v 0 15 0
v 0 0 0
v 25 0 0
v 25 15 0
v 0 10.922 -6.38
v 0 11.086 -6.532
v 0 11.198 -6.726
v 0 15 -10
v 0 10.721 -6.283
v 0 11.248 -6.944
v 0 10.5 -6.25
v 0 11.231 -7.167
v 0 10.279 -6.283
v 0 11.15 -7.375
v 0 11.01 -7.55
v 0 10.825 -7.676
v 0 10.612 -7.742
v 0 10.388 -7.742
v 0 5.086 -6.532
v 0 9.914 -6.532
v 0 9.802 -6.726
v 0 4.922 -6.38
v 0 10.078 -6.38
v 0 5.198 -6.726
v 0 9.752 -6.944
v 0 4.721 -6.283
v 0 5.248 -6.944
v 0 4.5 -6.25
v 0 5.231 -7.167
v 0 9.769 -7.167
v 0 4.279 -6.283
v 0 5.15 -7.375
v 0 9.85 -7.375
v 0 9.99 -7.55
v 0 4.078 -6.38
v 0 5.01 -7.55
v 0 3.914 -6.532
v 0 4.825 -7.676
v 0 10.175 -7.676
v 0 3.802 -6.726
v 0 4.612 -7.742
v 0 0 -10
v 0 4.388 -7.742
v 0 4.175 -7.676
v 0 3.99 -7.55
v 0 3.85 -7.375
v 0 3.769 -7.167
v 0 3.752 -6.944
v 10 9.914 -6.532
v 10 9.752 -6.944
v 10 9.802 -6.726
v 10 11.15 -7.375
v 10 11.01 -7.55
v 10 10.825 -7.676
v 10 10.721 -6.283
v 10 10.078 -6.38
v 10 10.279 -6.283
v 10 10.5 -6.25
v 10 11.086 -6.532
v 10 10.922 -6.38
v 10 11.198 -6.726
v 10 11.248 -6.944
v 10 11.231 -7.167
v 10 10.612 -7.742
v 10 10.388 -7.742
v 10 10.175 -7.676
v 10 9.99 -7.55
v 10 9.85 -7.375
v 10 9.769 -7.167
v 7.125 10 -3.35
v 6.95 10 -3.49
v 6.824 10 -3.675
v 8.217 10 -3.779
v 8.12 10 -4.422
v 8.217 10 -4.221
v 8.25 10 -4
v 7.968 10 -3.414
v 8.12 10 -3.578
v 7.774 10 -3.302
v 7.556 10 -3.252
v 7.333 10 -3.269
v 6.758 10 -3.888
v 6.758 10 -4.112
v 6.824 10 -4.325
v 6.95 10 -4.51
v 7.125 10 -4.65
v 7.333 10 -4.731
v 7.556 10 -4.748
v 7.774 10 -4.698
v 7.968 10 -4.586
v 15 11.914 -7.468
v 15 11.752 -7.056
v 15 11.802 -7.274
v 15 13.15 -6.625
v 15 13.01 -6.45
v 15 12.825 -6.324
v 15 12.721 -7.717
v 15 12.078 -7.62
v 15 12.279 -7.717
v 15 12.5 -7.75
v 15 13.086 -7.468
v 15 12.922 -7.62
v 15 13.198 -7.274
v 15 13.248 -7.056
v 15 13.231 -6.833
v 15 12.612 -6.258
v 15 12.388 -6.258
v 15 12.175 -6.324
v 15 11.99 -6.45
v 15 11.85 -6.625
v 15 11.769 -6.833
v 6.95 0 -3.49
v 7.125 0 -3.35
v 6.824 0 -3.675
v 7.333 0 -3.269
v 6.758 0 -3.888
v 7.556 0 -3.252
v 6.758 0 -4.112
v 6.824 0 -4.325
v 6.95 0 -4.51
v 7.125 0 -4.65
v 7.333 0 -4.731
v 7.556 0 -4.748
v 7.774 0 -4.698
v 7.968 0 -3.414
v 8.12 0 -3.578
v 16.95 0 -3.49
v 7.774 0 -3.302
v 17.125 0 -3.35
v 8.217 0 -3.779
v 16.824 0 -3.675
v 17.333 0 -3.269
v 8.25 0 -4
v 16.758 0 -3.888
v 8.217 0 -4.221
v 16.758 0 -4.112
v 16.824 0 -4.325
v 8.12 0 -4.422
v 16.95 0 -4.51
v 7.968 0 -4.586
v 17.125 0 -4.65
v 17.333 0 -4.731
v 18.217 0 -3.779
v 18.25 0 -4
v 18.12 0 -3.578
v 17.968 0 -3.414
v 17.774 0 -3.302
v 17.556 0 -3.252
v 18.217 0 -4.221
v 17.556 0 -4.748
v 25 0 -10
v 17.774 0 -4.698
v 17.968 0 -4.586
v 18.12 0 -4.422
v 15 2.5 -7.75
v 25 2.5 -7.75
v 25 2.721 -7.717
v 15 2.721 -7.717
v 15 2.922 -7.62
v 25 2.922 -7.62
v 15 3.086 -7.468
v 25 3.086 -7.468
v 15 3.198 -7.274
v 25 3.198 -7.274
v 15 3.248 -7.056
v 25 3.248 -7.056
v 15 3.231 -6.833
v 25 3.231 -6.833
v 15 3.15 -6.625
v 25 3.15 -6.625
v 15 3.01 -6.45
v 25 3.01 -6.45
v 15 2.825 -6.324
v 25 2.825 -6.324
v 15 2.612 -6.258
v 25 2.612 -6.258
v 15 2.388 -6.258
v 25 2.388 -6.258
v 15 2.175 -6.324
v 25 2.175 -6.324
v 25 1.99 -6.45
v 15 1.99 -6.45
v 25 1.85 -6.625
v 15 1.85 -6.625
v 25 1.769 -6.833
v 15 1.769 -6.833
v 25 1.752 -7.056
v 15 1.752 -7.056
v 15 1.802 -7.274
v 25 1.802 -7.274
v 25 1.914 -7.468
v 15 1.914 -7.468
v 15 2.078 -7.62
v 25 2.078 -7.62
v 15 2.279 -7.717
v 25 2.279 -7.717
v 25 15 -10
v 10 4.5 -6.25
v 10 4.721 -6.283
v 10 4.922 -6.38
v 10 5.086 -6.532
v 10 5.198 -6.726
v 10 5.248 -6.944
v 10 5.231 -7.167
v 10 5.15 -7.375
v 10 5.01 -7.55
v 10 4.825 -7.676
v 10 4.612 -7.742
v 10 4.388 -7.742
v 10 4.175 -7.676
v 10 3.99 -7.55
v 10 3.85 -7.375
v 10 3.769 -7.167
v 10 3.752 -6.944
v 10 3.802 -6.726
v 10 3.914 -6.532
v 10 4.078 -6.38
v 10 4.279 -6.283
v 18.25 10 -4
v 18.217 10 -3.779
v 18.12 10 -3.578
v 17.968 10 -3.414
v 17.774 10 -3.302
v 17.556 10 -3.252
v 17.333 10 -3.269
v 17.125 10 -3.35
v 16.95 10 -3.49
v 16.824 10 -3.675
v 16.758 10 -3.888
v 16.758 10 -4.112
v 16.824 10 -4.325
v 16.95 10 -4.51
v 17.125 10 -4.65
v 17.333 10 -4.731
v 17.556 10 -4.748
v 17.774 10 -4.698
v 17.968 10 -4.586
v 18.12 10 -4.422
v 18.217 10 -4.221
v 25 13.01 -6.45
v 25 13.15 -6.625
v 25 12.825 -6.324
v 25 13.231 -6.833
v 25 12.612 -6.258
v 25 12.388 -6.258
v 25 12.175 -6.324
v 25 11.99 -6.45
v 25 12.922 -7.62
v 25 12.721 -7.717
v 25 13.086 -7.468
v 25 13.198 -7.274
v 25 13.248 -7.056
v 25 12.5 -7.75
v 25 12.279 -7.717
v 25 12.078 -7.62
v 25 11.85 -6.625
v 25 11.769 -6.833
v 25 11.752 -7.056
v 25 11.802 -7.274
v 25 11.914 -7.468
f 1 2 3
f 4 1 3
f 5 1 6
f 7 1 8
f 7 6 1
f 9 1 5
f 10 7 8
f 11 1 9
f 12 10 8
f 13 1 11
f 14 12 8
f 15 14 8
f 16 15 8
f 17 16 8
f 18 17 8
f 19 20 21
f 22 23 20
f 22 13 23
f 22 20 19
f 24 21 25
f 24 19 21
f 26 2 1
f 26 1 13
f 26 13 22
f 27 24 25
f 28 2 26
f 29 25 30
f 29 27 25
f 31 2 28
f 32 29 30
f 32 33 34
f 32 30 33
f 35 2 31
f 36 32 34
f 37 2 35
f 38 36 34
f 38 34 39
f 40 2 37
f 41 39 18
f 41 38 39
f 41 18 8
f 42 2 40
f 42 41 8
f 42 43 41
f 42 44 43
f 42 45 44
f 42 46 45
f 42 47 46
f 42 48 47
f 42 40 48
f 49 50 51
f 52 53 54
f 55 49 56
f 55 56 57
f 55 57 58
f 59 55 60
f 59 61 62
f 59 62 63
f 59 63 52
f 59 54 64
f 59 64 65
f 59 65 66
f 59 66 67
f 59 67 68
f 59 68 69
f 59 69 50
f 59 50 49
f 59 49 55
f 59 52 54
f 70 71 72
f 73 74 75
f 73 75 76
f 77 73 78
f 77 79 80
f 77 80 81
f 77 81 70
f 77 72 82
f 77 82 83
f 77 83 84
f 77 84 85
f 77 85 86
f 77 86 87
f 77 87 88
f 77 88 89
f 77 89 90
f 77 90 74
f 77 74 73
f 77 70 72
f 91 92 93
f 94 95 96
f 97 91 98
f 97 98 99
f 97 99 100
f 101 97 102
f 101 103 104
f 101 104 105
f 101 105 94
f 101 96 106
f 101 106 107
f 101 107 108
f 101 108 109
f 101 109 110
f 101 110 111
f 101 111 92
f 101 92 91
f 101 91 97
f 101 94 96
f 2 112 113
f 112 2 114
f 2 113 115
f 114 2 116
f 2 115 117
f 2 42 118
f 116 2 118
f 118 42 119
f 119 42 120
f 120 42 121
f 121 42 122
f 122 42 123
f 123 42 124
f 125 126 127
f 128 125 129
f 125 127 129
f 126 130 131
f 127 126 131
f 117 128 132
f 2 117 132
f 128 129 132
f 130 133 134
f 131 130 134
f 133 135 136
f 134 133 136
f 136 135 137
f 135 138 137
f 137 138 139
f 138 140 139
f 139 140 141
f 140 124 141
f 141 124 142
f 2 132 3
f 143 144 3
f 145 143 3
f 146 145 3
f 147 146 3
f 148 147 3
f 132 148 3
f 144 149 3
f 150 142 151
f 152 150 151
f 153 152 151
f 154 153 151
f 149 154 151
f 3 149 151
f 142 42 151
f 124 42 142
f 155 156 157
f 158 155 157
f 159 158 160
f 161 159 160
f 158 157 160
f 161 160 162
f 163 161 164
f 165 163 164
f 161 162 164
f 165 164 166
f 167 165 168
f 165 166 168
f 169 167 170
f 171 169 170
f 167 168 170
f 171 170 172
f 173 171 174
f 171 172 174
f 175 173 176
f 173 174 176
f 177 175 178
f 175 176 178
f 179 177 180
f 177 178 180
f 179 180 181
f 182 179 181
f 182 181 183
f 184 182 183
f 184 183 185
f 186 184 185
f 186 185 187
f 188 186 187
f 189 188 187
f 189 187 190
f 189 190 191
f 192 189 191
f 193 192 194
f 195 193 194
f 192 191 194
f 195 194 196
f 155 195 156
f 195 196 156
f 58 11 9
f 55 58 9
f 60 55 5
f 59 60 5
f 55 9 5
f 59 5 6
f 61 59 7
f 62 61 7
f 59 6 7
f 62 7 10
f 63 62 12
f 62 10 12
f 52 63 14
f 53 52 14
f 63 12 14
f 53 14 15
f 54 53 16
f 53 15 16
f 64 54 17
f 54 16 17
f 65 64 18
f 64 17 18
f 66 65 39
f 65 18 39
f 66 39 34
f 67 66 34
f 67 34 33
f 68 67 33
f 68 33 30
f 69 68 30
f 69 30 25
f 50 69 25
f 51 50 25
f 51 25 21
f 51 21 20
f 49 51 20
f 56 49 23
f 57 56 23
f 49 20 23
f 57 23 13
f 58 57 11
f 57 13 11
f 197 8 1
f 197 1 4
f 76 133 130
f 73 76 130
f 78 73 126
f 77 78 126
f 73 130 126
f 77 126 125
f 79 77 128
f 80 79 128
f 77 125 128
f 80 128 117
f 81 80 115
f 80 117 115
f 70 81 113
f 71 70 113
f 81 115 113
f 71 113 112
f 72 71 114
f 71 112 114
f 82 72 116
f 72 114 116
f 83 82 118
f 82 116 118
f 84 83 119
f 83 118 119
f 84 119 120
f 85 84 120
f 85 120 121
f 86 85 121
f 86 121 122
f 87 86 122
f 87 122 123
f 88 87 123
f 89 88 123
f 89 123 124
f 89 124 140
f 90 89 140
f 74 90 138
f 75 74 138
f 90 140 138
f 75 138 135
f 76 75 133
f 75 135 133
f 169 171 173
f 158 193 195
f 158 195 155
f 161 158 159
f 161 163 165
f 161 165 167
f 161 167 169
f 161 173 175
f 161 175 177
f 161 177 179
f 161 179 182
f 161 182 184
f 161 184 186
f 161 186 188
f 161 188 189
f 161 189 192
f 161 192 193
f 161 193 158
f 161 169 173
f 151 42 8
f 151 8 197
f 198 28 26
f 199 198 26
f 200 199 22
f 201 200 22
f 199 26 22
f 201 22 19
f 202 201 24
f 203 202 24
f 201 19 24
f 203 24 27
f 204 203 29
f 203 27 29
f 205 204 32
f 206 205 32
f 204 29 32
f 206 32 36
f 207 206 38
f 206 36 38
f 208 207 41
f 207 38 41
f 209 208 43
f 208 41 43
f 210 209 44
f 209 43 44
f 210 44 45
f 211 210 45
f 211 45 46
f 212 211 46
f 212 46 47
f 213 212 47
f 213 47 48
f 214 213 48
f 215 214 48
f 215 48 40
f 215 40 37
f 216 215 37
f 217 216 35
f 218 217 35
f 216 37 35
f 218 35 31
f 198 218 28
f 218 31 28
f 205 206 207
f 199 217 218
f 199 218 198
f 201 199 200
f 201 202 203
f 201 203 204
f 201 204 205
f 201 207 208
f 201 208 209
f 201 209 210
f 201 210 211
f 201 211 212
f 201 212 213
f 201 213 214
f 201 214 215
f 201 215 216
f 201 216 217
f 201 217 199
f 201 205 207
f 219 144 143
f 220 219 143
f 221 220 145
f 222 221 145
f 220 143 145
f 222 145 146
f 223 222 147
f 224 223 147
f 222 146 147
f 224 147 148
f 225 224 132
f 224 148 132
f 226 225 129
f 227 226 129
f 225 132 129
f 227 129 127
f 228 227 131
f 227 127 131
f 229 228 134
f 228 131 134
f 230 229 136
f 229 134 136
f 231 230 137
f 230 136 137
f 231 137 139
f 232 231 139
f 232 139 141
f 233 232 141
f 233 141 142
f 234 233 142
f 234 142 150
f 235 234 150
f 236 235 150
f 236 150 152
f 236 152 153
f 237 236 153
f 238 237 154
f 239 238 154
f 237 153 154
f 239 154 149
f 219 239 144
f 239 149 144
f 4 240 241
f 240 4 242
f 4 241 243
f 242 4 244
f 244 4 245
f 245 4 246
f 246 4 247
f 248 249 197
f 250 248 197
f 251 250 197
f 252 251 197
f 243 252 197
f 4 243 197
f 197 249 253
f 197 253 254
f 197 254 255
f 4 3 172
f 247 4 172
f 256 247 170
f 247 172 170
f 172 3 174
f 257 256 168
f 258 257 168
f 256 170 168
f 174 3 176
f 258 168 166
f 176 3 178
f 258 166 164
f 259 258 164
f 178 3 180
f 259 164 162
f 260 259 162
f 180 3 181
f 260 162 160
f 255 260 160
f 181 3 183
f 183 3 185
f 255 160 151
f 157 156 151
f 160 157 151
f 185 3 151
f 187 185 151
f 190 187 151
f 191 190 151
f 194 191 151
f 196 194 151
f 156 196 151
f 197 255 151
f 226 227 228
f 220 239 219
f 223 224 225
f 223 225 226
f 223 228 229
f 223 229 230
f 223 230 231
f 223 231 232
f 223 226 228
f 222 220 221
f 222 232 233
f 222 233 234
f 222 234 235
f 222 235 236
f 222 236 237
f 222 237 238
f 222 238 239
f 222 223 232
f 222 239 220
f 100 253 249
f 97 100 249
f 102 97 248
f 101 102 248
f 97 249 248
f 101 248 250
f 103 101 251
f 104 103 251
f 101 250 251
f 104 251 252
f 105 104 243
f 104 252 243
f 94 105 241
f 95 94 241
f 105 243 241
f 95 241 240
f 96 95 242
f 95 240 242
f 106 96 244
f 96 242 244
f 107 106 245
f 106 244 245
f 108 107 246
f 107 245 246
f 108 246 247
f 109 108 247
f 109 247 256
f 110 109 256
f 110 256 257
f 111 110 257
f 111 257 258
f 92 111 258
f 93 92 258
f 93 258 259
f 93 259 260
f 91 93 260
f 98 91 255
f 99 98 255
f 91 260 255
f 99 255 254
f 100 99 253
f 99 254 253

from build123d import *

# Parameters (mm, degrees)
SKETCH1_W           = 25
SKETCH1_H           = 10
BOSS_EXTRUDE1_DEPTH = 15
SKETCH2_R           = 0.75
CUT_EXTRUDE1_DEPTH  = 10
SKETCH3_R           = 0.75
CUT_EXTRUDE2_DEPTH  = 10
SKETCH4_R           = 0.75
CUT_EXTRUDE3_DEPTH  = 10


with BuildPart() as part:
    # Sketch1 → Boss-Extrude1 (new body)
    with BuildSketch(Plane(origin=(0, 0, 0), x_dir=(1, 0, 0), z_dir=(0, 1, 0))):
        with Locations((12.5, 5)):
            Rectangle(SKETCH1_W, SKETCH1_H)
    extrude(amount=BOSS_EXTRUDE1_DEPTH)

    # Sketch2 → Cut-Extrude1 (cut)
    with BuildSketch(Plane.XZ):
        with Locations((7.5, -4)):
            Circle(SKETCH2_R)
        with Locations((17.5, -4)):
            Circle(SKETCH2_R)
    extrude(amount=-CUT_EXTRUDE1_DEPTH, mode=Mode.SUBTRACT)

    # Sketch3 → Cut-Extrude2 (cut)
    with BuildSketch(Plane.ZY):
        with Locations((-7, 10.5)):
            Circle(SKETCH3_R)
        with Locations((-7, 4.5)):
            Circle(SKETCH3_R)
    extrude(amount=-CUT_EXTRUDE2_DEPTH, mode=Mode.SUBTRACT)

    # Sketch4 → Cut-Extrude3 (cut)
    with BuildSketch(Plane(origin=(25, 0, 0), x_dir=(0, 0, -1), z_dir=(1, 0, 0))):
        with Locations((7, 12.5)):
            Circle(SKETCH4_R)
        with Locations((7, 2.5)):
            Circle(SKETCH4_R)
    extrude(amount=-CUT_EXTRUDE3_DEPTH, mode=Mode.SUBTRACT)


solid = part.part
